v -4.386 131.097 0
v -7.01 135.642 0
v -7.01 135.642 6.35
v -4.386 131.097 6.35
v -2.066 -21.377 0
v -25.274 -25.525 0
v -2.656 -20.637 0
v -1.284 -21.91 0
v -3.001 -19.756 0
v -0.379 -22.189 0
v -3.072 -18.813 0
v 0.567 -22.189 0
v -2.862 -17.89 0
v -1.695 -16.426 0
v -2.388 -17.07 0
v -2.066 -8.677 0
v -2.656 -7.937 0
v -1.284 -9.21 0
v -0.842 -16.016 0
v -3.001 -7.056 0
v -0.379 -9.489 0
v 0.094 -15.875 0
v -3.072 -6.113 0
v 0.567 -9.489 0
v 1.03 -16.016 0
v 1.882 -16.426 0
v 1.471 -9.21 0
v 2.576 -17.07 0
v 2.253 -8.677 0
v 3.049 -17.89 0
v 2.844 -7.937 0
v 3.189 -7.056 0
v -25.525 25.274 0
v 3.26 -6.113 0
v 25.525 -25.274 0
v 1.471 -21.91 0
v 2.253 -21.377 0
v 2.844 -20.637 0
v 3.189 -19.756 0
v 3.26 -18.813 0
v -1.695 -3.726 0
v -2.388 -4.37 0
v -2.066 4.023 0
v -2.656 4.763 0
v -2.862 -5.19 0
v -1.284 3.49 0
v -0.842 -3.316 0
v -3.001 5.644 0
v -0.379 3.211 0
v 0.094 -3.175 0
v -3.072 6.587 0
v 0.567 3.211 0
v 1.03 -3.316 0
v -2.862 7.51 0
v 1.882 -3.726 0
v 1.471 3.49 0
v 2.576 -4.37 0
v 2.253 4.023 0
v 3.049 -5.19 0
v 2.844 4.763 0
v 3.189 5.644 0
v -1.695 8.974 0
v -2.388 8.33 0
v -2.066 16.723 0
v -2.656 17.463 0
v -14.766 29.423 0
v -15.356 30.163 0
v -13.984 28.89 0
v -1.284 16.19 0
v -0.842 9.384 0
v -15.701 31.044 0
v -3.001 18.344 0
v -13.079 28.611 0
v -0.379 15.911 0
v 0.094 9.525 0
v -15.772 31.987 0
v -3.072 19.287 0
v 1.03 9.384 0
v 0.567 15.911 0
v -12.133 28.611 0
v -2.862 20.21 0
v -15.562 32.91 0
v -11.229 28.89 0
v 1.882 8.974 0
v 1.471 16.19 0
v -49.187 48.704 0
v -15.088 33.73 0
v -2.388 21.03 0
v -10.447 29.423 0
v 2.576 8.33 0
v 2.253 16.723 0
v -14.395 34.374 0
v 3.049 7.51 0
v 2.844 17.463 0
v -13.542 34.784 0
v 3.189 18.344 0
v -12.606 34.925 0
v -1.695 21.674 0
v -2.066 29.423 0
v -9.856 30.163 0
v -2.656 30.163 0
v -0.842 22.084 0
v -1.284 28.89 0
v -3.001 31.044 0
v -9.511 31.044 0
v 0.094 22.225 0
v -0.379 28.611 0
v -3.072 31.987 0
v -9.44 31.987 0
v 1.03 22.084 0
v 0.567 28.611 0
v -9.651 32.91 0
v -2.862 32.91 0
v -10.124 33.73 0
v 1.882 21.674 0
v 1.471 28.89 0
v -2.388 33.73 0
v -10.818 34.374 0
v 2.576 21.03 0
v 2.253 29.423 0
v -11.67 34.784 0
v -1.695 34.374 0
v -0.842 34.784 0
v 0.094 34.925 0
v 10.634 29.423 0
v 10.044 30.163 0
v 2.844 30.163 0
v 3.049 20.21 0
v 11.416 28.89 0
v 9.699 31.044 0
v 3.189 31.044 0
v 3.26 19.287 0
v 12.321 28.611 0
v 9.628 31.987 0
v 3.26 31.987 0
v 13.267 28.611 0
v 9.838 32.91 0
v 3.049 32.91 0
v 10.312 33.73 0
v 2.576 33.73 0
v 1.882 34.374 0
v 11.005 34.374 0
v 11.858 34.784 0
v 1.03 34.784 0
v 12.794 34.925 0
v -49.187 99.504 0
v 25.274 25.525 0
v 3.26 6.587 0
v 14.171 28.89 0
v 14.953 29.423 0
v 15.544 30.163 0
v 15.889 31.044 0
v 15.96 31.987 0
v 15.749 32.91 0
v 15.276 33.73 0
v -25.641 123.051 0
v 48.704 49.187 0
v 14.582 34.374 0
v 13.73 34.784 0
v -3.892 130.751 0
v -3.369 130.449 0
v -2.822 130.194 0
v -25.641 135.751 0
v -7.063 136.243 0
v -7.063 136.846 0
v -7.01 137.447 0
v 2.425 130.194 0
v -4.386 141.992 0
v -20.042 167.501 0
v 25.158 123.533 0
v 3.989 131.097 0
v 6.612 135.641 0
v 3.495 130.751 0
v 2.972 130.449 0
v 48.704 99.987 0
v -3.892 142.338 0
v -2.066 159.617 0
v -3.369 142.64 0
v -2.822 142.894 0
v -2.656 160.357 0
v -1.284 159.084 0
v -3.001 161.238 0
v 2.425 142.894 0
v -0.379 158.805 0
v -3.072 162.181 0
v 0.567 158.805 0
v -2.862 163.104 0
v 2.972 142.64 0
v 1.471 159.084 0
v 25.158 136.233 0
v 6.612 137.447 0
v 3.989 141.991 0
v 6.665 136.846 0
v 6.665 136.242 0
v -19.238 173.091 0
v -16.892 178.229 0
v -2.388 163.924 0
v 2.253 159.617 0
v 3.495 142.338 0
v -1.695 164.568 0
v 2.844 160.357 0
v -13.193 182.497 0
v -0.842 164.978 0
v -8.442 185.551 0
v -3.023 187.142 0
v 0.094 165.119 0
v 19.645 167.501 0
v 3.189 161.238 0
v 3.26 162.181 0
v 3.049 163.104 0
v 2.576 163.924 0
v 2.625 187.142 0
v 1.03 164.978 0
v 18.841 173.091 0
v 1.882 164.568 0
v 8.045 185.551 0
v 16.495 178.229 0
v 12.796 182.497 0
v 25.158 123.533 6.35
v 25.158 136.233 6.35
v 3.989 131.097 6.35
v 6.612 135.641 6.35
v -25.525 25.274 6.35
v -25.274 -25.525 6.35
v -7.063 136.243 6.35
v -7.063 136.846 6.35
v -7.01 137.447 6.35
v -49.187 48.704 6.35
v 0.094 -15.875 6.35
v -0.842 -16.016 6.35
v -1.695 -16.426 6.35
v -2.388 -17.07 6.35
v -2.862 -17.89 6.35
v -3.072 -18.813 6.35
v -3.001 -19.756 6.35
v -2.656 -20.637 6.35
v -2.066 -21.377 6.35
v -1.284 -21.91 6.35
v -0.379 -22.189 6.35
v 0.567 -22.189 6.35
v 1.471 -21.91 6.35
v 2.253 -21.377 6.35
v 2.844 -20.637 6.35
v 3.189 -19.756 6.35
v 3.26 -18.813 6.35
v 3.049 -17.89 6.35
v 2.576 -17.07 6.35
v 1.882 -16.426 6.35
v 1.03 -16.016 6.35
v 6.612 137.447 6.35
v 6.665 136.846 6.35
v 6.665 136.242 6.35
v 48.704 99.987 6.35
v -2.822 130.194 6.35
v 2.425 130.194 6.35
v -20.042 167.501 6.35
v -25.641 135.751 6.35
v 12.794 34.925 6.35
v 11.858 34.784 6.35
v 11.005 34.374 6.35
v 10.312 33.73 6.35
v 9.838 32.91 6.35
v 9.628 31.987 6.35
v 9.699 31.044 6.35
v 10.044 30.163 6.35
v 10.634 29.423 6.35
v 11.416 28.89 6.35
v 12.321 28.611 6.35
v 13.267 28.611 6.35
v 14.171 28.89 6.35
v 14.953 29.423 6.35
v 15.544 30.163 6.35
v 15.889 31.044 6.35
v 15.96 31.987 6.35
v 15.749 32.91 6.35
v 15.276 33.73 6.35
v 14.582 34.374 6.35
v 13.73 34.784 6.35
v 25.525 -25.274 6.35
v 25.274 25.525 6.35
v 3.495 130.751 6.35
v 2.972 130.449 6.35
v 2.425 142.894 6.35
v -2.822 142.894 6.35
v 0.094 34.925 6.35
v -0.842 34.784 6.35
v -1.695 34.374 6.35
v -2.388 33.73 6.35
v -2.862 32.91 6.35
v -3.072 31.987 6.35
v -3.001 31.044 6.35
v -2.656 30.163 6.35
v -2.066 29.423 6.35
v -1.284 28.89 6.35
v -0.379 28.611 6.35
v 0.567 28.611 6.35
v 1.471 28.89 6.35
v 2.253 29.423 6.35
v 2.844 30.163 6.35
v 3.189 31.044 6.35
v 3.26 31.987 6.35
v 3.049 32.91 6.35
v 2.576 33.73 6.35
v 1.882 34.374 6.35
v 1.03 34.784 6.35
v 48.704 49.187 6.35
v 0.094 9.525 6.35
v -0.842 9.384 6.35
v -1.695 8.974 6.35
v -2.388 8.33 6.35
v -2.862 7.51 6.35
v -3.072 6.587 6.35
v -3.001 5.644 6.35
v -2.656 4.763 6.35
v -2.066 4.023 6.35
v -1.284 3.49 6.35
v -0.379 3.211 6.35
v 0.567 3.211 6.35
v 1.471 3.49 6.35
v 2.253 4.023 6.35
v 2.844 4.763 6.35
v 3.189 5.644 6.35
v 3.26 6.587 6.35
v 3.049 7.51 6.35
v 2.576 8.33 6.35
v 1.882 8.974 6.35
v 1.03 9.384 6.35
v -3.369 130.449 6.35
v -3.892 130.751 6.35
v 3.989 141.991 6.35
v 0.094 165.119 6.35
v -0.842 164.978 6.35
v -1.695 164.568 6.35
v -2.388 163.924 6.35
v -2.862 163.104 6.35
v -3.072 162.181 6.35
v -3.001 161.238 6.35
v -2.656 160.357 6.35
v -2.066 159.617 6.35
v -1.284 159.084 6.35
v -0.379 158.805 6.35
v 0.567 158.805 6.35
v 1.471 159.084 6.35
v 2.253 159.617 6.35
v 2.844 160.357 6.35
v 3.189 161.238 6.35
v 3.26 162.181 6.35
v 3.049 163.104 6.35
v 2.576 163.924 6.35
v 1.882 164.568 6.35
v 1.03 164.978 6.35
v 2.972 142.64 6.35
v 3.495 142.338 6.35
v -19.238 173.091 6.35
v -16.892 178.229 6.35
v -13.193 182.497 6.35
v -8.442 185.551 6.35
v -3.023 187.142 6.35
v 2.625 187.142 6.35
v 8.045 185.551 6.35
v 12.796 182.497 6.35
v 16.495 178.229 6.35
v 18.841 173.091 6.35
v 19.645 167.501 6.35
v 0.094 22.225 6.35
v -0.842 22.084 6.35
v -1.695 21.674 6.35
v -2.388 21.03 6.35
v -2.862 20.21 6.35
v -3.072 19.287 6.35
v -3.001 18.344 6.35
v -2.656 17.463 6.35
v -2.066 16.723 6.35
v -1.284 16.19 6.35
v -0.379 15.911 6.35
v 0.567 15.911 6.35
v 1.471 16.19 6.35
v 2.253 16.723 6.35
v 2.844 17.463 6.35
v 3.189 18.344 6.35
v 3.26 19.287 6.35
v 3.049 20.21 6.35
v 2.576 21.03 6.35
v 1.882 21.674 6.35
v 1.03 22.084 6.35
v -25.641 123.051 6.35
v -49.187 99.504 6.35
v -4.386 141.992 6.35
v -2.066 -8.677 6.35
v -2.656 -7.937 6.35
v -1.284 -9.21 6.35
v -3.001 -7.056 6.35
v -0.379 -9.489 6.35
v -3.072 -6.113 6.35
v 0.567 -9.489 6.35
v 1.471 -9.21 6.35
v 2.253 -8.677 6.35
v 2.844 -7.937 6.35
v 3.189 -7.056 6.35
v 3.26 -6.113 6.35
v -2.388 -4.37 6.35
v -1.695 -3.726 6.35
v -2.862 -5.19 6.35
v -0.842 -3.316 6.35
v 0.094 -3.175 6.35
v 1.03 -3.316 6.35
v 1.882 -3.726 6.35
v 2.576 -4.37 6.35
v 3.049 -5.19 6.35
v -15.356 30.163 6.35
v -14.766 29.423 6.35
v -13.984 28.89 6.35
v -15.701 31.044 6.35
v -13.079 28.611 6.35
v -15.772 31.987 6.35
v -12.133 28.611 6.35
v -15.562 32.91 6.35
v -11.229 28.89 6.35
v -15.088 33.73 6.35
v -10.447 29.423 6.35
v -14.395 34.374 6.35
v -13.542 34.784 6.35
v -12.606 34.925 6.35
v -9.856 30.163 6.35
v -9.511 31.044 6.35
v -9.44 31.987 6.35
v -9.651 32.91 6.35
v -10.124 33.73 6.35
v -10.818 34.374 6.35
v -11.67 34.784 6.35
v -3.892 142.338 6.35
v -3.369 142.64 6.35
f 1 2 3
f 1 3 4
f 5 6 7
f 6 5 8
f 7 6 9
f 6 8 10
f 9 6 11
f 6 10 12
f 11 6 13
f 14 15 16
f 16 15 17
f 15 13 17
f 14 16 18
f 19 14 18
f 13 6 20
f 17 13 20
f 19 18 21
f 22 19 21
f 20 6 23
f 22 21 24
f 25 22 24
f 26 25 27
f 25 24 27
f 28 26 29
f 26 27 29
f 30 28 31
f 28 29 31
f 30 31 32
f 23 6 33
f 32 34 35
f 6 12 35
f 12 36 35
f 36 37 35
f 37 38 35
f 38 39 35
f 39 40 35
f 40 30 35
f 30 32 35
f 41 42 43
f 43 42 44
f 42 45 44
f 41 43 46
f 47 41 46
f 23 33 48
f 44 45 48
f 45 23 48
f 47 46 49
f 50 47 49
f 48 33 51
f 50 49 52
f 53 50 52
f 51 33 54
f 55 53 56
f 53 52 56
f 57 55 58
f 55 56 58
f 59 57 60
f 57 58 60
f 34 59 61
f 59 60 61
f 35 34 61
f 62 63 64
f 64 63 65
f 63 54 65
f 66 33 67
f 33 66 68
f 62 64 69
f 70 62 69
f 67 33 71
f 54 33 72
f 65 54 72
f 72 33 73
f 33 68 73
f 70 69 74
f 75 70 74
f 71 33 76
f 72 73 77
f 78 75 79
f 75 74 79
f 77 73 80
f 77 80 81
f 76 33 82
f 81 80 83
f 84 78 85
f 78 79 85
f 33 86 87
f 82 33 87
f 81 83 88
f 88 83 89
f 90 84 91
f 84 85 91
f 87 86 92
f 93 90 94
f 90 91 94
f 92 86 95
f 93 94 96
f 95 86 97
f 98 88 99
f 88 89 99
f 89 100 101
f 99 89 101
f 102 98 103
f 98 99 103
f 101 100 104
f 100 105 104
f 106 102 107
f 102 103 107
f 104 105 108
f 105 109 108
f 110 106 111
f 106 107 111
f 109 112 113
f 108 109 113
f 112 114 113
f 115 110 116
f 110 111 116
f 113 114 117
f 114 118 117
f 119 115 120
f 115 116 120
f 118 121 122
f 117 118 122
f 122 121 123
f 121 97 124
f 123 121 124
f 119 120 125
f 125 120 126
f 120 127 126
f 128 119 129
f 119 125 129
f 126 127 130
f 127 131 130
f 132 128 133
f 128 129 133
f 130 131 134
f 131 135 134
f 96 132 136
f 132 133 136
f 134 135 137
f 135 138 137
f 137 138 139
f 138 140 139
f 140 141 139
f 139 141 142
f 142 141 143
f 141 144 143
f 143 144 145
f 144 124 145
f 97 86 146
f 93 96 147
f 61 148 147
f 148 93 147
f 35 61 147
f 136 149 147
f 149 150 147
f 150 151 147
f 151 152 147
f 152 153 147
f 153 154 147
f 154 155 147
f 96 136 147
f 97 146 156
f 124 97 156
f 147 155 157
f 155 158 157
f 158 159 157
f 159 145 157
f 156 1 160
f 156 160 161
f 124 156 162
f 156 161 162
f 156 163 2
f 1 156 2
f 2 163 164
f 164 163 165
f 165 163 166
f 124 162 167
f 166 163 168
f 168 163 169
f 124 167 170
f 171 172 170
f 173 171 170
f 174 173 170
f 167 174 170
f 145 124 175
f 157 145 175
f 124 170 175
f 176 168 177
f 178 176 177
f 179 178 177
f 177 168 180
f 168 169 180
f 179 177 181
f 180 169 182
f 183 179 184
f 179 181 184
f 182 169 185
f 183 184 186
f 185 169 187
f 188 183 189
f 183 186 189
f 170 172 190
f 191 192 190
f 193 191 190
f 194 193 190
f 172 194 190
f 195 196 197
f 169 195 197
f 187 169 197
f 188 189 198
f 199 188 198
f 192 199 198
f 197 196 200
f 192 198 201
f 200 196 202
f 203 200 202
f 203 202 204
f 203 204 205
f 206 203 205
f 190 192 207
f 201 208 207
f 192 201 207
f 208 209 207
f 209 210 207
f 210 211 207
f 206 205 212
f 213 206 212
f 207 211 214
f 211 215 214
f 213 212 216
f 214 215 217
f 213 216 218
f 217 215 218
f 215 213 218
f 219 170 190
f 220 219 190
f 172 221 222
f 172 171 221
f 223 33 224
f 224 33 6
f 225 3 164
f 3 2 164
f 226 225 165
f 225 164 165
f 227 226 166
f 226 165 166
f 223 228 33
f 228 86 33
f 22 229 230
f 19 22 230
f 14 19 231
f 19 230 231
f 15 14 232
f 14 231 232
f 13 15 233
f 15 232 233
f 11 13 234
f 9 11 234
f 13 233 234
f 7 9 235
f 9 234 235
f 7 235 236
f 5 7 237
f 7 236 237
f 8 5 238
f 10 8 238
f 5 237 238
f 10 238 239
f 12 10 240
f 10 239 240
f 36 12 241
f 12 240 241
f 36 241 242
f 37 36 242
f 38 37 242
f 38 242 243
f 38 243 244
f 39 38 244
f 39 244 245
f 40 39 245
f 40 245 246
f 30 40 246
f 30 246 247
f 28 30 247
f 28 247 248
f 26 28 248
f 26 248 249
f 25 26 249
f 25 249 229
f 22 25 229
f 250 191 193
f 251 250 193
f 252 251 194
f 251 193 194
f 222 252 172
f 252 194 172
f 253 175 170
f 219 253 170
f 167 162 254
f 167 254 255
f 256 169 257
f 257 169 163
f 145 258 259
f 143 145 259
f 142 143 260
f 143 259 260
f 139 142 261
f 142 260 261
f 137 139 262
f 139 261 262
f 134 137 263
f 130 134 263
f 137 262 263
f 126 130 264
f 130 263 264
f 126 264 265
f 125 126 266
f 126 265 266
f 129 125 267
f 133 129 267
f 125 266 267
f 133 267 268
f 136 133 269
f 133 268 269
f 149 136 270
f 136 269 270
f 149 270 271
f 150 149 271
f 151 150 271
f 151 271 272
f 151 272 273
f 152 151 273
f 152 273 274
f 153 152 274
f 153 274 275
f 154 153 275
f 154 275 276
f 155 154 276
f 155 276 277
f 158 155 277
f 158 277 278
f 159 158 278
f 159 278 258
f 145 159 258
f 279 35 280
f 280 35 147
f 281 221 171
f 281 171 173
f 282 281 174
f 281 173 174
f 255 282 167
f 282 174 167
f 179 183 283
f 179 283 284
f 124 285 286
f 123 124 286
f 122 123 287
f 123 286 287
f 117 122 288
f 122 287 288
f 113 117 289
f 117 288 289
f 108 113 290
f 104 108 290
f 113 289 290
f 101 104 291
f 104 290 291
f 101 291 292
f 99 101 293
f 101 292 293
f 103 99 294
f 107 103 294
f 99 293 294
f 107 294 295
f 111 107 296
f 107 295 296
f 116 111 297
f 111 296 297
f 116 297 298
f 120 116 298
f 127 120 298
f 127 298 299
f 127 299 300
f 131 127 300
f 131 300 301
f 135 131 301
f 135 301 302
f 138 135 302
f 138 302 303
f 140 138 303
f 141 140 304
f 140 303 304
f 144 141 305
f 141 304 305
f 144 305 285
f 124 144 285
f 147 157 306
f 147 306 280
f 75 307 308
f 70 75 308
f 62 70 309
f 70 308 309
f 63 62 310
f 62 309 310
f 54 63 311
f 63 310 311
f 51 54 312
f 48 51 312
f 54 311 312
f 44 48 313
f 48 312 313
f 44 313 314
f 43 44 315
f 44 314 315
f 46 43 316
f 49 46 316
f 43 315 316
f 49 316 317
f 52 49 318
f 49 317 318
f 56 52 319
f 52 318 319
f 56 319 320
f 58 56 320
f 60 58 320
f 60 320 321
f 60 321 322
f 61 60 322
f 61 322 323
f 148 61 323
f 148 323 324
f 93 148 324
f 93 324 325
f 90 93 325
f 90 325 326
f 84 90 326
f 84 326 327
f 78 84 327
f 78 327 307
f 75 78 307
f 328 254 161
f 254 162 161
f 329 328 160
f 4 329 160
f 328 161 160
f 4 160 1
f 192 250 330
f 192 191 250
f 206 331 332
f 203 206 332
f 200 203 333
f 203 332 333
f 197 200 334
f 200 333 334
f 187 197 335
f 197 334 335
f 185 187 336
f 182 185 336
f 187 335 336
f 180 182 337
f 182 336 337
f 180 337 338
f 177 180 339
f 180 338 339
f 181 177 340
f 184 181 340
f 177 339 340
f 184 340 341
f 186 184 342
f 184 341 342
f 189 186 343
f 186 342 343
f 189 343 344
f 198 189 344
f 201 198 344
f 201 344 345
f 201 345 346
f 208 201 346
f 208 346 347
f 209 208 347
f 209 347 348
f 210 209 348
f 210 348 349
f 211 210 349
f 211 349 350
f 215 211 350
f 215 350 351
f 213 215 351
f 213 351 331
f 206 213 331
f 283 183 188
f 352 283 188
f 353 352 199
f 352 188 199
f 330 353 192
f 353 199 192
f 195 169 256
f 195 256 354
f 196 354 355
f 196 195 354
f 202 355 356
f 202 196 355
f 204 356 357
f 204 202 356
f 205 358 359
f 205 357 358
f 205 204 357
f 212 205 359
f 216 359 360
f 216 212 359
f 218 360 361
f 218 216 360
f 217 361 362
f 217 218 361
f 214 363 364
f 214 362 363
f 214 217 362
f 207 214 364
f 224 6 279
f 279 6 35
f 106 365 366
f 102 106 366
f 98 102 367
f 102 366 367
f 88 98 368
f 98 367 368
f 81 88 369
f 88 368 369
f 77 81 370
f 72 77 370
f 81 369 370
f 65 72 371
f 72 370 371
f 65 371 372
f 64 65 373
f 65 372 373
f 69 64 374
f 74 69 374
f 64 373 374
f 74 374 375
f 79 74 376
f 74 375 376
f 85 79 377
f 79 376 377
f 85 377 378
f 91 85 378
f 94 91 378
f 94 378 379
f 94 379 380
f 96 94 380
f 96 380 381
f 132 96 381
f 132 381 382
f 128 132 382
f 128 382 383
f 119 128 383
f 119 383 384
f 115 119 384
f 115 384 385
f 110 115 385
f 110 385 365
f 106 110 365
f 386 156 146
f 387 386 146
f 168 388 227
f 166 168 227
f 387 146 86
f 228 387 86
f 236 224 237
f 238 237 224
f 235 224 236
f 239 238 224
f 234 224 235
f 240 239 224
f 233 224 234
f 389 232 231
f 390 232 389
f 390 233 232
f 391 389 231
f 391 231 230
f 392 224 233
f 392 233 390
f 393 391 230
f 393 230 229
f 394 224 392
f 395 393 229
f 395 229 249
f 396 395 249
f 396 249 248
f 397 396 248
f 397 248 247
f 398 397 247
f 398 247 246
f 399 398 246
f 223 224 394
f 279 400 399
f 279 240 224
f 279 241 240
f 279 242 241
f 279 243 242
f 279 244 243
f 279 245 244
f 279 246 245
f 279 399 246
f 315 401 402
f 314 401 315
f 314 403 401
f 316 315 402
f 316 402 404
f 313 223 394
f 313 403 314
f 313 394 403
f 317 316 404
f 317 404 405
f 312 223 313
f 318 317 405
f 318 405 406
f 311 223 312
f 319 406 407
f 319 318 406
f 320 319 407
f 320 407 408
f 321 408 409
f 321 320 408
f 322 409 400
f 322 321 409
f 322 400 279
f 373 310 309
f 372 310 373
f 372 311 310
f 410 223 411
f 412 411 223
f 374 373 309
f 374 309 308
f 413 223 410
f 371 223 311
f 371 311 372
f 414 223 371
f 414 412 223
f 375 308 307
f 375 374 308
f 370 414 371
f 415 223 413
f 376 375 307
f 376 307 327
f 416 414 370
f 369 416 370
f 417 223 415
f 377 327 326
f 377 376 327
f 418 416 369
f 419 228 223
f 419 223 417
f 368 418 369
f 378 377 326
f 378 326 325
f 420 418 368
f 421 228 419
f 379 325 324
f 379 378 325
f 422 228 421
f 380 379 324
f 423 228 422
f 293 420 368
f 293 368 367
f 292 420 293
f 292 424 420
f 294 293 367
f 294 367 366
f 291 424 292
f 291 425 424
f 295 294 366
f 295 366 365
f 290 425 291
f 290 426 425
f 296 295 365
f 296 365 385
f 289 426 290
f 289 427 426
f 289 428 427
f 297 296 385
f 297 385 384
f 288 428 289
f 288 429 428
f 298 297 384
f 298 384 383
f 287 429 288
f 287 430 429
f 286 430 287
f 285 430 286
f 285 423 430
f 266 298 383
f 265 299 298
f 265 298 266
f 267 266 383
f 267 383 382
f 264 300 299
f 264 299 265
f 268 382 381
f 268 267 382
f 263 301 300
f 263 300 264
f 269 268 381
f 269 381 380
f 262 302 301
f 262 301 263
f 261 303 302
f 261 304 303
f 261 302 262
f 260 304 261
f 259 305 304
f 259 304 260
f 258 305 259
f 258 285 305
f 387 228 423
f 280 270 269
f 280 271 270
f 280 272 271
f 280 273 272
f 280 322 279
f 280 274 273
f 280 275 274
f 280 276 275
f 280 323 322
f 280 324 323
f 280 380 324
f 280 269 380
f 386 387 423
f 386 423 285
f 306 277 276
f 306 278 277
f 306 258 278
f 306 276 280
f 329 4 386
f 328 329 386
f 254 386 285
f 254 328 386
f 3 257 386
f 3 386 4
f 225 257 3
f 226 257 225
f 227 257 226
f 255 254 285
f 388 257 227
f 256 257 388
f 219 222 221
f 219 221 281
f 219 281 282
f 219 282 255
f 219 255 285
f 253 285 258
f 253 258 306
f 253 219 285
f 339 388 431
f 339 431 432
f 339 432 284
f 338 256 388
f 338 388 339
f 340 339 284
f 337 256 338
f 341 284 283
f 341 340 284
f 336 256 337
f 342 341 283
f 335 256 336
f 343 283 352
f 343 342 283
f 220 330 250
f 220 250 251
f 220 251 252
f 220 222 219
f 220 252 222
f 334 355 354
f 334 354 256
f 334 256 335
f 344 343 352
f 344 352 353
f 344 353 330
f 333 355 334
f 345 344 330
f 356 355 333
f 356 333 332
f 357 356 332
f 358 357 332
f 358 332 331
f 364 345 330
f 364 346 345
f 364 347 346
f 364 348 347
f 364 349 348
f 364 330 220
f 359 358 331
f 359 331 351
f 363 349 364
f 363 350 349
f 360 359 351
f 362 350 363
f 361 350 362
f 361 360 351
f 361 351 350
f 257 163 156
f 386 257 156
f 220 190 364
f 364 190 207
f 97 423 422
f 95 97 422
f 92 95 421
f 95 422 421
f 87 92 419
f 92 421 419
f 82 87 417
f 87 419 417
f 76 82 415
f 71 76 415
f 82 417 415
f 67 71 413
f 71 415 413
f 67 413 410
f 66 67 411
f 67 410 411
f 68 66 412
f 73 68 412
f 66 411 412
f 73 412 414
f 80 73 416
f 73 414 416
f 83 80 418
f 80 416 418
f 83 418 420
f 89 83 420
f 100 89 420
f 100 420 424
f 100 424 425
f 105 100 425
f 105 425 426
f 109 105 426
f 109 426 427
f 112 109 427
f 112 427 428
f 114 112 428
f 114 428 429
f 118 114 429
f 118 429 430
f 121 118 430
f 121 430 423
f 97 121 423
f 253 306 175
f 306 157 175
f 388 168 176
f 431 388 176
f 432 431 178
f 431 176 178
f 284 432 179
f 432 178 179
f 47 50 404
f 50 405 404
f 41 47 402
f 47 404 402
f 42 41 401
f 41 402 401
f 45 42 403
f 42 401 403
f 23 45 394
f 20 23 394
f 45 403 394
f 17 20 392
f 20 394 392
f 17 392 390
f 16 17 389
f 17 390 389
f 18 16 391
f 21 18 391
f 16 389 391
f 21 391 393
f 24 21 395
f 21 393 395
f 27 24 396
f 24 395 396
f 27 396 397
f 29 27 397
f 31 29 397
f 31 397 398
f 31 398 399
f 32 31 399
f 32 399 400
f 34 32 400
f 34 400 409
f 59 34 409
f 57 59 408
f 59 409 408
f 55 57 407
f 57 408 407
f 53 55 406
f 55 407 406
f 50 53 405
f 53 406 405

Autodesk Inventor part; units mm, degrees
ref_plane "YZ Plane" through (0, 0, 0) normal (1, 0, 0) x (0, 1, 0)
ref_plane "XZ Plane" through (0, 0, 0) normal (0, 1, 0) x (-1, 0, 0)
ref_plane "XY Plane" through (0, 0, 0) normal (0, 0, 1) x (1, 0, 0)
sketch "Sketch1" plane through (0, 0, 0) normal (0, 0, 1) x (1, 0, 0)
  line L0 (-25.5248, 25.2745) -> (-25.2745, -25.5248) construction
  line L1 (-25.2745, -25.5248) -> (25.5248, -25.2745) construction
  line L2 (25.5248, -25.2745) -> (25.2745, 25.5248) construction
  line L3 (25.2745, 25.5248) -> (-25.2745, -25.5248) construction
  line L4 (-25.5248, 25.2745) -> (25.5248, -25.2745) construction
  line L5 (25.2745, 25.5248) -> (48.7045, 49.1868) construction
  line L6 (-25.5248, 25.2745) -> (-49.1868, 48.7045) construction
  line L7 (48.7045, 49.1868) -> (48.7045, 99.9868) construction
  line L8 (-49.1868, 48.7045) -> (-49.1868, 99.5045) construction
  line L9 (-49.1868, 99.5045) -> (-25.6406, 123.0507) construction
  line L10 (48.7045, 99.9868) -> (25.1582, 123.533) construction
  line L11 (-25.6406, 123.0507) -> (-25.6406, 135.7507) construction
  line L12 (25.1582, 123.533) -> (25.1582, 136.233) construction
  line L13 (25.1582, 136.233) -> (19.6449, 167.5007) construction
  line L14 (-25.6406, 135.7507) -> (-20.0422, 167.5007) construction
  line L15 (-20.0422, 167.5007) -> (19.6449, 167.5007) construction
  arc A0 (19.6449, 167.5007) -> (-20.0422, 167.5007) centre (-0.1987, 167.5007) ccw construction
  line L16 (-25.2745, -25.5248) -> (25.5248, -25.2745)
  line L17 (25.5248, -25.2745) -> (25.2745, 25.5248)
  line L18 (48.7045, 49.1868) -> (25.2745, 25.5248)
  line L19 (48.7045, 49.1868) -> (48.7045, 99.9868)
  line L20 (48.7045, 99.9868) -> (25.1582, 123.533)
  line L21 (25.1582, 123.533) -> (25.1582, 136.233)
  line L22 (25.1582, 136.233) -> (19.6449, 167.5007)
  line L23 (-20.0422, 167.5007) -> (-25.6406, 135.7507)
  line L24 (-25.6406, 135.7507) -> (-25.6406, 123.0507)
  line L25 (-25.6406, 123.0507) -> (-49.1868, 99.5045)
  line L26 (-49.1868, 99.5045) -> (-49.1868, 48.7045)
  line L27 (-49.1868, 48.7045) -> (-25.5248, 25.2745)
  line L28 (-25.5248, 25.2745) -> (-25.2745, -25.5248)
  arc A1 (19.6449, 167.5007) -> (-20.0422, 167.5007) centre (-0.1987, 167.5007) ccw
  point P0 (0, 0)
  dimension "d0" = 50.8
  dimension "d1" = 50.8
  dimension "d2" = 33.2994
  dimension "d3" = 33.2994
  dimension "d4" = 135
  dimension "d5" = 135
  dimension "d6" = 50.8
  dimension "d7" = 50.8
  dimension "d8" = 33.2994
  dimension "d9" = 33.2994
  dimension "d10" = 135
  dimension "d11" = 135
  dimension "d12" = 12.7
  dimension "d13" = 12.7
  dimension "d15" = 31.75
  dimension "d16" = 170
  dimension "d17" = 31.75
  dimension "d18" = 170
extrude "Extrusion1" add sketch "Sketch1" along normal blind 6.35
sketch "Sketch2" plane through (0, 0, 0) normal (0, 0, -1) x (-1, 0, 0)
  line L0 (25.2745, -25.5248) -> (-25.5248, -25.2745) projected
  line L1 (-25.5248, -25.2745) -> (-25.2745, 25.5248) projected
  arc A0 (20.0422, 167.5007) -> (-19.6449, 167.5007) centre (0.1987, 167.5007) ccw projected
  line L2 (3.8648, 142.8942) -> (7.531, 136.5442)
  line L3 (7.531, 136.5442) -> (3.8648, 130.1942)
  line L4 (3.8648, 130.1942) -> (-3.4675, 130.1942)
  line L5 (-3.4675, 130.1942) -> (-7.1337, 136.5442)
  line L6 (-7.1337, 136.5442) -> (-3.4675, 142.8942)
  line L7 (-3.4675, 142.8942) -> (3.8648, 142.8942)
  circle A1 centre (0.1987, 136.5442) radius 6.8707
  point P0 (0, 0)
  point P1 (-0.0939, -19.0498)
  point P2 (-0.0939, -6.3498)
  point P3 (-0.0939, 6.3502)
  point P4 (-0.0939, 19.0502)
  point P5 (-0.0939, 31.7502)
  point P6 (12.6061, 31.7502)
  point P7 (-12.7939, 31.7502)
  point P8 (-0.0939, 161.9442)
  point P9 (0.1987, 187.3442)
  point P10 (0.1987, 187.3442)
  point P11 (2.8224, 130.1942)
  point P12 (4.386, 131.097)
  point P13 (7.0098, 135.6415)
  point P14 (7.0098, 137.447)
  point P15 (4.386, 141.9915)
  point P16 (2.8224, 142.8942)
  point P17 (-2.4251, 142.8942)
  point P18 (-3.9887, 141.9915)
  point P19 (-6.6125, 137.447)
  point P20 (-6.6125, 135.6415)
  point P21 (-3.9887, 131.097)
  point P22 (-2.4251, 130.1942)
  dimension "d21" = 6.35
  dimension "d22" = 25.4
  dimension "d23" = 12.7
  dimension "d24" = 12.7
  dimension "d25" = 12.7
  dimension "d26" = 12.7
  dimension "d27" = 12.7
  dimension "d28" = 12.7
  dimension "d29" = 25.4
  dimension "d31" = 25.4
  dimension "d41" = 13.7414
  dimension "d42" = 12.7
hole "Hole1" at (0.0939, -19.0498, 0) at (0.0939, -6.3498, 0) at (0.0939, 6.3502, 0) at (0.0939, 19.0502, 0) at (0.0939, 31.7502, 0) at (-12.6061, 31.7502, 0) at (12.7939, 31.7502, 0) at (0.0939, 161.9442, 0) direction (0, 0, 1) diameter 6.35 end through all clearance for "Flat Head Machine Screw (82)" size "1/4" standard "Ansi Unified Screw Threads"
extrude "Extrusion2" cut sketch "Sketch2" against normal blind 6.35 contours L2 A1 L3 L4 L5 L6 L7
equation "\"d3\" = d2"
equation "\"d5\" = d4"
equation "\"d7\" = d6"
equation "\"d11\" = d10"
equation "\"d13\" = d12"
equation "\"d17\" = d15"
equation "\"d18\" = d16"
equation "\"d24\" = d23"
equation "\"d25\" = d23"
equation "\"d28\" = d27"
properties part number "CL1-001" material "Aluminum 6061"
